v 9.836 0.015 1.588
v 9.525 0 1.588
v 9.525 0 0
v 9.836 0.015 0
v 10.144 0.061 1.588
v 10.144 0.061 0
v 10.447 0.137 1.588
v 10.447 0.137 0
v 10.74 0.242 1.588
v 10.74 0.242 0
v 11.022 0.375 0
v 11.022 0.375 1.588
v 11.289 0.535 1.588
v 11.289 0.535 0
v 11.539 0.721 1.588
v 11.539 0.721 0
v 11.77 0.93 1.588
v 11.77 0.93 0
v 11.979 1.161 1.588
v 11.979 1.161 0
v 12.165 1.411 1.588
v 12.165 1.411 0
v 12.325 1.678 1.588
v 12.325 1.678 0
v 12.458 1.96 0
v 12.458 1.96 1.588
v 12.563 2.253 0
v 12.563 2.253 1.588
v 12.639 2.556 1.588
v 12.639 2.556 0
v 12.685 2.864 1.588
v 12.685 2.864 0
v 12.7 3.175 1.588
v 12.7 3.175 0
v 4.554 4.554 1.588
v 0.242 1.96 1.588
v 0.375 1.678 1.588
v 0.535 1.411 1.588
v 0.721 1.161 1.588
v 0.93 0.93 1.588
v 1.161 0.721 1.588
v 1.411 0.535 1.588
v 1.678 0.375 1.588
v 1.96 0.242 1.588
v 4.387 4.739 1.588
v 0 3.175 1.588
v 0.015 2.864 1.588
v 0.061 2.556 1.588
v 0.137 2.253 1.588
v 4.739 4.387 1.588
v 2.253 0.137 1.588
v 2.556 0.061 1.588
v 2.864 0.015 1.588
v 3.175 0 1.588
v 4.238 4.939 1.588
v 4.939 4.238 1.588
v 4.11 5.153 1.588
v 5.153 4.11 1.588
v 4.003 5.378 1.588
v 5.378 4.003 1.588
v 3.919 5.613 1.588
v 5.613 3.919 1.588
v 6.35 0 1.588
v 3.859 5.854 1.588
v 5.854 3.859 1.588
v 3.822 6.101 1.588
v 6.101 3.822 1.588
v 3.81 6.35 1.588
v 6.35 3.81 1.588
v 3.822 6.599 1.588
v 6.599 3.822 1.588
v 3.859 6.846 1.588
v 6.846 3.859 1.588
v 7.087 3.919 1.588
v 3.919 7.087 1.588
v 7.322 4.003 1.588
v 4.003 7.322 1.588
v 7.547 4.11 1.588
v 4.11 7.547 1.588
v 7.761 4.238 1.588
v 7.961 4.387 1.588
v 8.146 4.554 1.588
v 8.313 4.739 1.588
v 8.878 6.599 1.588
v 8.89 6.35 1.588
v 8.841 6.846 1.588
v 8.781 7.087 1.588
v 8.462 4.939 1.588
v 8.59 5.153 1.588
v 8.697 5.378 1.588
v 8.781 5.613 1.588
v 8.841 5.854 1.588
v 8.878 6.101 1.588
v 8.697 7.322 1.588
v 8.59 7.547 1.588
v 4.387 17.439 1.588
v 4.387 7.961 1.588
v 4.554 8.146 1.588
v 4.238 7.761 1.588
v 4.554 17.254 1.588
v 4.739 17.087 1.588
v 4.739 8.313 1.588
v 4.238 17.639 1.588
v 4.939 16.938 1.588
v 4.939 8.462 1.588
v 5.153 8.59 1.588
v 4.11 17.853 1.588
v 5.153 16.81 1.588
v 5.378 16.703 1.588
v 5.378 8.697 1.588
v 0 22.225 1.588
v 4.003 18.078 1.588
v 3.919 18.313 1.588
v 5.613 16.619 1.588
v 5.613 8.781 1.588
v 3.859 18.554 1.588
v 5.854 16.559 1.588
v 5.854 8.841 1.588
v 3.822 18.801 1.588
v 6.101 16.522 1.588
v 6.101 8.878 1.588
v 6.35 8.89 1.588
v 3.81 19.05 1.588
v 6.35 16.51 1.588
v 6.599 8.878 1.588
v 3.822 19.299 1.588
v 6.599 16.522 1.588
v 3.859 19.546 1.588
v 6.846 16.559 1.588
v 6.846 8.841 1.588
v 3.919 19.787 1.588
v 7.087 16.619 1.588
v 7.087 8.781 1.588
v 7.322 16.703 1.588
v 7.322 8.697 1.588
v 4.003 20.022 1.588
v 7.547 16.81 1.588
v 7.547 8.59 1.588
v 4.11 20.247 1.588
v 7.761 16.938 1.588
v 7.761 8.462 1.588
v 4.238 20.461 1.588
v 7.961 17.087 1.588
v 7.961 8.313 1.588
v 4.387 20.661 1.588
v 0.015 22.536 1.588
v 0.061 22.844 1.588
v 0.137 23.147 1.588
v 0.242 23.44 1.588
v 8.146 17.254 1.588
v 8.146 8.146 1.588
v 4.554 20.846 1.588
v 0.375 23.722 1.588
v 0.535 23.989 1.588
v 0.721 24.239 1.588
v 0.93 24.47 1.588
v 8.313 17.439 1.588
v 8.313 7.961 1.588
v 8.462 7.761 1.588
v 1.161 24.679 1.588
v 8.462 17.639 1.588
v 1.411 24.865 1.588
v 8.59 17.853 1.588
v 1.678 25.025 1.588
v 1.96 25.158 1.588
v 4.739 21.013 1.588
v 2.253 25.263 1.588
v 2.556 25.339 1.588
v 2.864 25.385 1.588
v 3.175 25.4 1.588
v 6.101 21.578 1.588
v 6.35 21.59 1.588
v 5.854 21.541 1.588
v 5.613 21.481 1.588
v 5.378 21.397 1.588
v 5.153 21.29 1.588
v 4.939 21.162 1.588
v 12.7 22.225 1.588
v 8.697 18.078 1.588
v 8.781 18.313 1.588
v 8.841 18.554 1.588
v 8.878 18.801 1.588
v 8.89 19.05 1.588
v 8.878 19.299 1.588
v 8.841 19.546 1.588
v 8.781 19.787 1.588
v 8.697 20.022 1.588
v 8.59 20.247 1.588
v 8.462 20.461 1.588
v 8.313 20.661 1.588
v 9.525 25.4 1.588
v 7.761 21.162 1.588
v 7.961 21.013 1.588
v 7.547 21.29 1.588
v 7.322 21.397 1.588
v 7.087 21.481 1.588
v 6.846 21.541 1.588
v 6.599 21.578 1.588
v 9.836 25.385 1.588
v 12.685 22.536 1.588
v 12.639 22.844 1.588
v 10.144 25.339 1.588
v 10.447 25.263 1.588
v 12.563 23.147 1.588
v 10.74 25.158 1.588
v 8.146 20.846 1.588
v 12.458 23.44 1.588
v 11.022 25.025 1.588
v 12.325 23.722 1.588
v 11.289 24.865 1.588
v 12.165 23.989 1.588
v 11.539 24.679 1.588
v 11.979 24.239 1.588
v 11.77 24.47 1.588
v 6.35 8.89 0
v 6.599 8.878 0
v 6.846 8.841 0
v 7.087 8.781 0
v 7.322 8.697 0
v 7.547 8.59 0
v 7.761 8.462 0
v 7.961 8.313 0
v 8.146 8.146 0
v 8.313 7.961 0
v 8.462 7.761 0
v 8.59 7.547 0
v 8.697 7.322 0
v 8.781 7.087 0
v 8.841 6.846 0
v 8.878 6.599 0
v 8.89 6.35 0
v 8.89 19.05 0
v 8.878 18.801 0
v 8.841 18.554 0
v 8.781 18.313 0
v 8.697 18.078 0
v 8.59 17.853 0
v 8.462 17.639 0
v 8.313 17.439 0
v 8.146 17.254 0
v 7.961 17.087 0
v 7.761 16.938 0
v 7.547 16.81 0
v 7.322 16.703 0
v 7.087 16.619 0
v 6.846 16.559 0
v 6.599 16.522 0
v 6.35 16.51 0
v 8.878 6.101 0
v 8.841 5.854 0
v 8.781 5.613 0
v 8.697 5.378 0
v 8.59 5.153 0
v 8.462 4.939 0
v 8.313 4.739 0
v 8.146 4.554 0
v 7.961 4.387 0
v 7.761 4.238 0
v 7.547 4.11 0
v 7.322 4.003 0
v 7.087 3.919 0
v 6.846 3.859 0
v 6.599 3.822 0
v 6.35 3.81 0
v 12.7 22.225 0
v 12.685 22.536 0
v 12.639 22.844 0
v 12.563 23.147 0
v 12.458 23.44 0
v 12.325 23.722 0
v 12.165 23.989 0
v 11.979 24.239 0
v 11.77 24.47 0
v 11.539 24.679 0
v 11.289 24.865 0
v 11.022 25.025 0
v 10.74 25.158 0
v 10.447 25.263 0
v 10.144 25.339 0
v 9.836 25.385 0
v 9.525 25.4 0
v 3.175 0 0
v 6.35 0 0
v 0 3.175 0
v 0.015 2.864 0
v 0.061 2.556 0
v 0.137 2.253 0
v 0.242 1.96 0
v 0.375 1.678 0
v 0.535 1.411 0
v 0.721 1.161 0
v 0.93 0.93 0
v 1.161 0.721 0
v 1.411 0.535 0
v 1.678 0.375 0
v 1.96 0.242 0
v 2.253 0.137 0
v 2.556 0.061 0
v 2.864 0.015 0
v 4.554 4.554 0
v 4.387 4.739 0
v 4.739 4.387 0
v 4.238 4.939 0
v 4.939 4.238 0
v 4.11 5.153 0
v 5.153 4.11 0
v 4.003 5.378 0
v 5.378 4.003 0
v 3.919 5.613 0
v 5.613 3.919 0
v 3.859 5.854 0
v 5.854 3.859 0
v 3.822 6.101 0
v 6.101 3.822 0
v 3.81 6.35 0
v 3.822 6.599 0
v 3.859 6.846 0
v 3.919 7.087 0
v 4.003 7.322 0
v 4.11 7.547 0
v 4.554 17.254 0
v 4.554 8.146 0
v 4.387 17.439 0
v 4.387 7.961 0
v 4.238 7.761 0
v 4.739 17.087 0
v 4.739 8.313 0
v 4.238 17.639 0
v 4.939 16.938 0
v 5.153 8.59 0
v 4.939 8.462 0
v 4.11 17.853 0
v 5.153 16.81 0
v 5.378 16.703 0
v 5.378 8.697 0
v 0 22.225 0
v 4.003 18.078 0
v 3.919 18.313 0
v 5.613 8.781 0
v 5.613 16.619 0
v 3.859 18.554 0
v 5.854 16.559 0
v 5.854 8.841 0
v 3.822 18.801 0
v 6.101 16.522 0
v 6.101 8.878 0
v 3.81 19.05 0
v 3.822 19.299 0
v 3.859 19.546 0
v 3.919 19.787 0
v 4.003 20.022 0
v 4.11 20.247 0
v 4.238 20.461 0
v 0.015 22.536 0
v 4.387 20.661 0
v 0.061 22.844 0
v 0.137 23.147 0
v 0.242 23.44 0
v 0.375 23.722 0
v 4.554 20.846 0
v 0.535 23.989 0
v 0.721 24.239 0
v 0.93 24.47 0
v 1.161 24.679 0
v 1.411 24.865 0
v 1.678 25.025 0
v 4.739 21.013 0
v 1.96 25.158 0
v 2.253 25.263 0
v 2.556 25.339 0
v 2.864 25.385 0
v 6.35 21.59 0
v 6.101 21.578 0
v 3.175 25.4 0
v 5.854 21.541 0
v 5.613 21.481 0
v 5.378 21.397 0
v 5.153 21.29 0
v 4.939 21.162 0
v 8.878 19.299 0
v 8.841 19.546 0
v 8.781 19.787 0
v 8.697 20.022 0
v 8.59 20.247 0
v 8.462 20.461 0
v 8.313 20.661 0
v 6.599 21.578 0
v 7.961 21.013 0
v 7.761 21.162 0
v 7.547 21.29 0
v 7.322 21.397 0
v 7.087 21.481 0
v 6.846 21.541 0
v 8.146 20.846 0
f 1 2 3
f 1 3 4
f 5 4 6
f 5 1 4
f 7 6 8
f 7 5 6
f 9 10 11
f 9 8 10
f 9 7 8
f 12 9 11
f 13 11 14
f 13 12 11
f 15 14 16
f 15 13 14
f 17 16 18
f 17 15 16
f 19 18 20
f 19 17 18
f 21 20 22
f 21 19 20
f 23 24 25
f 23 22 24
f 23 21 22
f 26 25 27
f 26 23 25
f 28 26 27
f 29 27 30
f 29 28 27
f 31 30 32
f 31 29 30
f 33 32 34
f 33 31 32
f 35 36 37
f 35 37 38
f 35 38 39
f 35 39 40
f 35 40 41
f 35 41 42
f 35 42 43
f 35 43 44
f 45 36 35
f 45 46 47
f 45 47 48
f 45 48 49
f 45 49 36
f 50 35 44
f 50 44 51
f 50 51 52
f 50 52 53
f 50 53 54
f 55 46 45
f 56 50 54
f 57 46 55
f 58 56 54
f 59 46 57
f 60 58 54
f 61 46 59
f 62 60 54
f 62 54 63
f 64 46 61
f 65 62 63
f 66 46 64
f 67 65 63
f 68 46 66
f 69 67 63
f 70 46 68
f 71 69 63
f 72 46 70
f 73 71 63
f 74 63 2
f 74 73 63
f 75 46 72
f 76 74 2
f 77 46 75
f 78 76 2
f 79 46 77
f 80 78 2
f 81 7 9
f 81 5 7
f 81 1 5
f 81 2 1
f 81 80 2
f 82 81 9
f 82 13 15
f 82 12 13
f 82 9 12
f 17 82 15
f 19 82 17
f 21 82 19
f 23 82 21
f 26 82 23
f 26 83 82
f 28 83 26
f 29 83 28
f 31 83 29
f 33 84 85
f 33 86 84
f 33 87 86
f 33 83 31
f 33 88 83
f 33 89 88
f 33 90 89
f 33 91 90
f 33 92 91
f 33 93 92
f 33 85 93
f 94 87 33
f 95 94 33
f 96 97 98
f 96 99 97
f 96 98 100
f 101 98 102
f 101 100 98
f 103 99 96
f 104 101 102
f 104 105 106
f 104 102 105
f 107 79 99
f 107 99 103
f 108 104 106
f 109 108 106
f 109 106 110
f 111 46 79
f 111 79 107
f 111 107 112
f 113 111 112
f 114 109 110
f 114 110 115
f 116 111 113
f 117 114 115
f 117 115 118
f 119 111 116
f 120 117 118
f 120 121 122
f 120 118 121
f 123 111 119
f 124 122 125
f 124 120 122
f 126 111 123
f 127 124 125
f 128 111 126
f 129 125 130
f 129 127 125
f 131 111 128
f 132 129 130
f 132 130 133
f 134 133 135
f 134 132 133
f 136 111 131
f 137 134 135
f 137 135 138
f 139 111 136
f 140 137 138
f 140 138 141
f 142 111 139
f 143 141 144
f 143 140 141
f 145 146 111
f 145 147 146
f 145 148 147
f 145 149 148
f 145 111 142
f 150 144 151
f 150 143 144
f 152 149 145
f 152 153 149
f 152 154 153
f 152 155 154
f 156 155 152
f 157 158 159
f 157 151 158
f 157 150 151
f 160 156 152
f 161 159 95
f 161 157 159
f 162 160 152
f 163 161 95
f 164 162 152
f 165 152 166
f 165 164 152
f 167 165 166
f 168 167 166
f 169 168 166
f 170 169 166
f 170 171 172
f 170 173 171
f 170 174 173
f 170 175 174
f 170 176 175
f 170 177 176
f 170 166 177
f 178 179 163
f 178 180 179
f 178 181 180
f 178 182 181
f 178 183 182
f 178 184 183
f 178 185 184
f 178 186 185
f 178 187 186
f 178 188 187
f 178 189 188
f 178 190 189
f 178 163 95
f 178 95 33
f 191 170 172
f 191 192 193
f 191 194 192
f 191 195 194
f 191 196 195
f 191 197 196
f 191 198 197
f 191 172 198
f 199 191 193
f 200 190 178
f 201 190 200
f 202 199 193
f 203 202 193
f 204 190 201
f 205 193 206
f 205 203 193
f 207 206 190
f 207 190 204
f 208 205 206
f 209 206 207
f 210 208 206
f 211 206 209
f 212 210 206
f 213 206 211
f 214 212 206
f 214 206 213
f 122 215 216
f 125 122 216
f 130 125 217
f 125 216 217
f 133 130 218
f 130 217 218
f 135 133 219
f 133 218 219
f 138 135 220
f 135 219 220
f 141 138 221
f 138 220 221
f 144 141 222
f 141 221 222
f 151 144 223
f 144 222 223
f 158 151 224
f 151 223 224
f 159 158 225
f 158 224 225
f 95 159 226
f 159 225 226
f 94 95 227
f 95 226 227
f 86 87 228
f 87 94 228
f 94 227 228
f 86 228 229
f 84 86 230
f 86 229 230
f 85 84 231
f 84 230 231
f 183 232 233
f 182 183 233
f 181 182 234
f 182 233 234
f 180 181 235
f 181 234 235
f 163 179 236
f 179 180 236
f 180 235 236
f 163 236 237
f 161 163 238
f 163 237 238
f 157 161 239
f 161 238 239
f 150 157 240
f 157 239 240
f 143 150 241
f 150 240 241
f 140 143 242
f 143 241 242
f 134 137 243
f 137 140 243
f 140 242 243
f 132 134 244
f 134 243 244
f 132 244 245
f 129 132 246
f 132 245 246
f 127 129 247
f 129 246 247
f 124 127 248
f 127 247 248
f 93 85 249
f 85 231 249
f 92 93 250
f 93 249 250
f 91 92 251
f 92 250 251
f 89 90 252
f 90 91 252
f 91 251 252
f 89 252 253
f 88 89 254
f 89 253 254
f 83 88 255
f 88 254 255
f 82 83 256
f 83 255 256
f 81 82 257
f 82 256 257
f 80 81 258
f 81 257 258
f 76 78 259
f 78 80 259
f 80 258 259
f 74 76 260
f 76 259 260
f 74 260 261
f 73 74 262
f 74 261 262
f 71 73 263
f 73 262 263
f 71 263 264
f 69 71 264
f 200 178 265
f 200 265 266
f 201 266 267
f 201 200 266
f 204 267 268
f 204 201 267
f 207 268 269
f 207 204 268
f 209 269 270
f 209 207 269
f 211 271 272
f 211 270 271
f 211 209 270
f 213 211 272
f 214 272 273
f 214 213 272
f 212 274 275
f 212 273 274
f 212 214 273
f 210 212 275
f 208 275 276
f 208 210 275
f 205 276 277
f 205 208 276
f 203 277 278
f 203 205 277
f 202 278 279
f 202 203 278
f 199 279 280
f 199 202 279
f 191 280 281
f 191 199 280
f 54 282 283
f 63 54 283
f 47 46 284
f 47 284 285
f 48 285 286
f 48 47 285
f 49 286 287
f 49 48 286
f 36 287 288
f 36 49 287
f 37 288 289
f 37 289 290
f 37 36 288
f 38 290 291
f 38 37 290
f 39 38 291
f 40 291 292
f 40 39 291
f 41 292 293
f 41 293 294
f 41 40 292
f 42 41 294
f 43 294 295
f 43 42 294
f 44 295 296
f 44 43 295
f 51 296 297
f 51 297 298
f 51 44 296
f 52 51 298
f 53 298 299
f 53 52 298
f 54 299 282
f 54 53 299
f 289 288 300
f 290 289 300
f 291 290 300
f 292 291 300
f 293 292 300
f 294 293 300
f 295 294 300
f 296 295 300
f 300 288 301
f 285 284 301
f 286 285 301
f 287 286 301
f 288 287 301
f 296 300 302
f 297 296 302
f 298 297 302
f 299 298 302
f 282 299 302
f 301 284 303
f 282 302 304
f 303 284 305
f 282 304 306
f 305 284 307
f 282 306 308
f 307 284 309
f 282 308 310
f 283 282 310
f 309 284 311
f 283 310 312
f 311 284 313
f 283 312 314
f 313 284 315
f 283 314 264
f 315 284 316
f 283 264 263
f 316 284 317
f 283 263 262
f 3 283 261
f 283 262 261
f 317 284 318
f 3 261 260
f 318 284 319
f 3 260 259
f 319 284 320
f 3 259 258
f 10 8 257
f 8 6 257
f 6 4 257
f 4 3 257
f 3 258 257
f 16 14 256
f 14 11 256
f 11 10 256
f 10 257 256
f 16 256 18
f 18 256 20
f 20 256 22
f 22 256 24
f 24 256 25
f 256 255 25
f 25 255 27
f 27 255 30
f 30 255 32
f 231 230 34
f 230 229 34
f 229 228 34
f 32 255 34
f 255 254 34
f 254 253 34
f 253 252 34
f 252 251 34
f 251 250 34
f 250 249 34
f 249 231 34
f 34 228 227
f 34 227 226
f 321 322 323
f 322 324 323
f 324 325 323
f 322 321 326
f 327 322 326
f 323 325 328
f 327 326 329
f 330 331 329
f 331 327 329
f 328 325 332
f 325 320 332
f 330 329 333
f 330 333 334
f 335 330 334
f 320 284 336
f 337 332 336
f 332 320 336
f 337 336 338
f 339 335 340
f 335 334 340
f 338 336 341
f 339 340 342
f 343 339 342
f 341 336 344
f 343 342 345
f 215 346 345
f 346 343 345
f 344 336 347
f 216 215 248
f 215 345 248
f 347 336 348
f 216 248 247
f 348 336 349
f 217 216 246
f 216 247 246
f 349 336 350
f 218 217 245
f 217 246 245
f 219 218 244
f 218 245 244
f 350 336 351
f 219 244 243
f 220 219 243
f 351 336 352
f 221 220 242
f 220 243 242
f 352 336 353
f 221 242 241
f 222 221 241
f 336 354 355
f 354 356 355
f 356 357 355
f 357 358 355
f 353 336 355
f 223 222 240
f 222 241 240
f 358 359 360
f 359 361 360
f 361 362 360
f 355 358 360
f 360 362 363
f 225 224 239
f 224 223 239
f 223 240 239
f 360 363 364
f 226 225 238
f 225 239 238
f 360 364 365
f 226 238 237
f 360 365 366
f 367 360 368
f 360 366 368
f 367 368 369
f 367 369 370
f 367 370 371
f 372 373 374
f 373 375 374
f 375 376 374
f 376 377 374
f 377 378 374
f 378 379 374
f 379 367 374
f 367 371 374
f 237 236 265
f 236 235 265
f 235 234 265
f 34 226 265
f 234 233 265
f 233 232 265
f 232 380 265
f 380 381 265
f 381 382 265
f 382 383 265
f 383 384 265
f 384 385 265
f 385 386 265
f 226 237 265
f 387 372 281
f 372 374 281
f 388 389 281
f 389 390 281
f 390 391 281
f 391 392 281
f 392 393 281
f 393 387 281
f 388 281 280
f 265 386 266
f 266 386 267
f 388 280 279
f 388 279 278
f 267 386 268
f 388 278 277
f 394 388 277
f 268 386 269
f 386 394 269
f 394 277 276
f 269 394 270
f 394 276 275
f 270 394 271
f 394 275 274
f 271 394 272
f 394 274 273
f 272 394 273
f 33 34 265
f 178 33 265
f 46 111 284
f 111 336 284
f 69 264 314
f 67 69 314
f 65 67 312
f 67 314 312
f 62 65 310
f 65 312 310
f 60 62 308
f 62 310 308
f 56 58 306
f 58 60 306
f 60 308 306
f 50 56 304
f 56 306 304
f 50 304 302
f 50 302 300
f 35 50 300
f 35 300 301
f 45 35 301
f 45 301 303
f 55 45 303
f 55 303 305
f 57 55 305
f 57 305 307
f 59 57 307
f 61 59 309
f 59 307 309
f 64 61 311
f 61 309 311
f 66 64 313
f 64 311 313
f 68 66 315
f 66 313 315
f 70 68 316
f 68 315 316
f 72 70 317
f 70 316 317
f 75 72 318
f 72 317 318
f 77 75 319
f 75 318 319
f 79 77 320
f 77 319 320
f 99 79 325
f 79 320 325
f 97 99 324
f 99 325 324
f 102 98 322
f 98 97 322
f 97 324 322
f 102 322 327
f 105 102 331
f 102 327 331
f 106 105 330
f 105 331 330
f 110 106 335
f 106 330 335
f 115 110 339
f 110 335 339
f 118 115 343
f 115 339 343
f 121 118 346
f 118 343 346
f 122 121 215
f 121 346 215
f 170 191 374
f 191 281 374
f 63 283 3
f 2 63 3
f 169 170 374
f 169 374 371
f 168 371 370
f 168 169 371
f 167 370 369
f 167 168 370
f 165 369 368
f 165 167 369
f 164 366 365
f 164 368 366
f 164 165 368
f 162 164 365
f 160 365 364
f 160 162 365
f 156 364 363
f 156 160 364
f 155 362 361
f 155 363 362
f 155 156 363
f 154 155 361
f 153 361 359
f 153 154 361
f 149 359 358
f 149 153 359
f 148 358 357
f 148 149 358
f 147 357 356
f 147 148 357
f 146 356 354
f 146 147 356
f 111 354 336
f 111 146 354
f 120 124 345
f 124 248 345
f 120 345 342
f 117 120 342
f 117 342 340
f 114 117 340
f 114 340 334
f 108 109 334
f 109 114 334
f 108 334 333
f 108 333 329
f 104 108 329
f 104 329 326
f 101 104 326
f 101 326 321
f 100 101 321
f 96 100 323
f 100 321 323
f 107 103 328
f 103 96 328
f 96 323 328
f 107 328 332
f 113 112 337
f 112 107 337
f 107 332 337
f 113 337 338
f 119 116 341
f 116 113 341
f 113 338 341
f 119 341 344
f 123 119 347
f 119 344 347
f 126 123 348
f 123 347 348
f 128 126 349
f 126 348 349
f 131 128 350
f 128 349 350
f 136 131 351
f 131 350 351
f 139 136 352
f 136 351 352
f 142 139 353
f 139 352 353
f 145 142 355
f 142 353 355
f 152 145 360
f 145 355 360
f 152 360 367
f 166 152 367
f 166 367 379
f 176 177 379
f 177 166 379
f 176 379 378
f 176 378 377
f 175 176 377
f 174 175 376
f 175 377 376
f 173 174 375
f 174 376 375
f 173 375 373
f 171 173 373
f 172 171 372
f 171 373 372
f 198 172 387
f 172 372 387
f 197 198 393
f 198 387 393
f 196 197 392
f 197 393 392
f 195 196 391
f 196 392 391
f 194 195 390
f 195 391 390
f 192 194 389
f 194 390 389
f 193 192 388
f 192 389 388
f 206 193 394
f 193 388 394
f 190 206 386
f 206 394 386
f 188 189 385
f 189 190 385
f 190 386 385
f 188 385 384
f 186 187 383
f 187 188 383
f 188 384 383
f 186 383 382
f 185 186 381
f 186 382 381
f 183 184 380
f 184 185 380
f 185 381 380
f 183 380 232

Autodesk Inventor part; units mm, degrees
ref_plane "YZ Plane" through (0, 0, 0) normal (1, 0, 0) x (0, 1, 0)
ref_plane "XZ Plane" through (0, 0, 0) normal (0, 1, 0) x (-1, 0, 0)
ref_plane "XY Plane" through (0, 0, 0) normal (0, 0, 1) x (1, 0, 0)
sketch "Sketch1" plane through (0, 0, 0) normal (0, 0, 1) x (1, 0, 0)
  line L0 (0, 0) -> (12.7, 0)
  line L1 (12.7, 0) -> (12.7, 25.4)
  line L2 (12.7, 25.4) -> (0, 25.4)
  line L3 (0, 25.4) -> (0, 0)
  line L4 (6.35, 0) -> (6.35, 6.35)
  circle A0 centre (6.35, 6.35) radius 2.54
  line L5 (6.35, 6.35) -> (6.35, 19.05)
  circle A1 centre (6.35, 19.05) radius 2.54
  dimension "d0" = 12.7
  dimension "d1" = 25.4
  dimension "d2" = 6.35
  dimension "d3" = 5.08
  dimension "d4" = 12.7
  dimension "d5" = 5.08
extrude "Extrusion1" add sketch "Sketch1" along normal blind 1.5875
fillet "Fillet1" radius 3.175 4 edges at (12.7, 25.4, 0.7937) (0, 25.4, 0.7937) (12.7, 0, 0.7937) (0, 0, 0.7937)
properties part number "polySpacer2"
